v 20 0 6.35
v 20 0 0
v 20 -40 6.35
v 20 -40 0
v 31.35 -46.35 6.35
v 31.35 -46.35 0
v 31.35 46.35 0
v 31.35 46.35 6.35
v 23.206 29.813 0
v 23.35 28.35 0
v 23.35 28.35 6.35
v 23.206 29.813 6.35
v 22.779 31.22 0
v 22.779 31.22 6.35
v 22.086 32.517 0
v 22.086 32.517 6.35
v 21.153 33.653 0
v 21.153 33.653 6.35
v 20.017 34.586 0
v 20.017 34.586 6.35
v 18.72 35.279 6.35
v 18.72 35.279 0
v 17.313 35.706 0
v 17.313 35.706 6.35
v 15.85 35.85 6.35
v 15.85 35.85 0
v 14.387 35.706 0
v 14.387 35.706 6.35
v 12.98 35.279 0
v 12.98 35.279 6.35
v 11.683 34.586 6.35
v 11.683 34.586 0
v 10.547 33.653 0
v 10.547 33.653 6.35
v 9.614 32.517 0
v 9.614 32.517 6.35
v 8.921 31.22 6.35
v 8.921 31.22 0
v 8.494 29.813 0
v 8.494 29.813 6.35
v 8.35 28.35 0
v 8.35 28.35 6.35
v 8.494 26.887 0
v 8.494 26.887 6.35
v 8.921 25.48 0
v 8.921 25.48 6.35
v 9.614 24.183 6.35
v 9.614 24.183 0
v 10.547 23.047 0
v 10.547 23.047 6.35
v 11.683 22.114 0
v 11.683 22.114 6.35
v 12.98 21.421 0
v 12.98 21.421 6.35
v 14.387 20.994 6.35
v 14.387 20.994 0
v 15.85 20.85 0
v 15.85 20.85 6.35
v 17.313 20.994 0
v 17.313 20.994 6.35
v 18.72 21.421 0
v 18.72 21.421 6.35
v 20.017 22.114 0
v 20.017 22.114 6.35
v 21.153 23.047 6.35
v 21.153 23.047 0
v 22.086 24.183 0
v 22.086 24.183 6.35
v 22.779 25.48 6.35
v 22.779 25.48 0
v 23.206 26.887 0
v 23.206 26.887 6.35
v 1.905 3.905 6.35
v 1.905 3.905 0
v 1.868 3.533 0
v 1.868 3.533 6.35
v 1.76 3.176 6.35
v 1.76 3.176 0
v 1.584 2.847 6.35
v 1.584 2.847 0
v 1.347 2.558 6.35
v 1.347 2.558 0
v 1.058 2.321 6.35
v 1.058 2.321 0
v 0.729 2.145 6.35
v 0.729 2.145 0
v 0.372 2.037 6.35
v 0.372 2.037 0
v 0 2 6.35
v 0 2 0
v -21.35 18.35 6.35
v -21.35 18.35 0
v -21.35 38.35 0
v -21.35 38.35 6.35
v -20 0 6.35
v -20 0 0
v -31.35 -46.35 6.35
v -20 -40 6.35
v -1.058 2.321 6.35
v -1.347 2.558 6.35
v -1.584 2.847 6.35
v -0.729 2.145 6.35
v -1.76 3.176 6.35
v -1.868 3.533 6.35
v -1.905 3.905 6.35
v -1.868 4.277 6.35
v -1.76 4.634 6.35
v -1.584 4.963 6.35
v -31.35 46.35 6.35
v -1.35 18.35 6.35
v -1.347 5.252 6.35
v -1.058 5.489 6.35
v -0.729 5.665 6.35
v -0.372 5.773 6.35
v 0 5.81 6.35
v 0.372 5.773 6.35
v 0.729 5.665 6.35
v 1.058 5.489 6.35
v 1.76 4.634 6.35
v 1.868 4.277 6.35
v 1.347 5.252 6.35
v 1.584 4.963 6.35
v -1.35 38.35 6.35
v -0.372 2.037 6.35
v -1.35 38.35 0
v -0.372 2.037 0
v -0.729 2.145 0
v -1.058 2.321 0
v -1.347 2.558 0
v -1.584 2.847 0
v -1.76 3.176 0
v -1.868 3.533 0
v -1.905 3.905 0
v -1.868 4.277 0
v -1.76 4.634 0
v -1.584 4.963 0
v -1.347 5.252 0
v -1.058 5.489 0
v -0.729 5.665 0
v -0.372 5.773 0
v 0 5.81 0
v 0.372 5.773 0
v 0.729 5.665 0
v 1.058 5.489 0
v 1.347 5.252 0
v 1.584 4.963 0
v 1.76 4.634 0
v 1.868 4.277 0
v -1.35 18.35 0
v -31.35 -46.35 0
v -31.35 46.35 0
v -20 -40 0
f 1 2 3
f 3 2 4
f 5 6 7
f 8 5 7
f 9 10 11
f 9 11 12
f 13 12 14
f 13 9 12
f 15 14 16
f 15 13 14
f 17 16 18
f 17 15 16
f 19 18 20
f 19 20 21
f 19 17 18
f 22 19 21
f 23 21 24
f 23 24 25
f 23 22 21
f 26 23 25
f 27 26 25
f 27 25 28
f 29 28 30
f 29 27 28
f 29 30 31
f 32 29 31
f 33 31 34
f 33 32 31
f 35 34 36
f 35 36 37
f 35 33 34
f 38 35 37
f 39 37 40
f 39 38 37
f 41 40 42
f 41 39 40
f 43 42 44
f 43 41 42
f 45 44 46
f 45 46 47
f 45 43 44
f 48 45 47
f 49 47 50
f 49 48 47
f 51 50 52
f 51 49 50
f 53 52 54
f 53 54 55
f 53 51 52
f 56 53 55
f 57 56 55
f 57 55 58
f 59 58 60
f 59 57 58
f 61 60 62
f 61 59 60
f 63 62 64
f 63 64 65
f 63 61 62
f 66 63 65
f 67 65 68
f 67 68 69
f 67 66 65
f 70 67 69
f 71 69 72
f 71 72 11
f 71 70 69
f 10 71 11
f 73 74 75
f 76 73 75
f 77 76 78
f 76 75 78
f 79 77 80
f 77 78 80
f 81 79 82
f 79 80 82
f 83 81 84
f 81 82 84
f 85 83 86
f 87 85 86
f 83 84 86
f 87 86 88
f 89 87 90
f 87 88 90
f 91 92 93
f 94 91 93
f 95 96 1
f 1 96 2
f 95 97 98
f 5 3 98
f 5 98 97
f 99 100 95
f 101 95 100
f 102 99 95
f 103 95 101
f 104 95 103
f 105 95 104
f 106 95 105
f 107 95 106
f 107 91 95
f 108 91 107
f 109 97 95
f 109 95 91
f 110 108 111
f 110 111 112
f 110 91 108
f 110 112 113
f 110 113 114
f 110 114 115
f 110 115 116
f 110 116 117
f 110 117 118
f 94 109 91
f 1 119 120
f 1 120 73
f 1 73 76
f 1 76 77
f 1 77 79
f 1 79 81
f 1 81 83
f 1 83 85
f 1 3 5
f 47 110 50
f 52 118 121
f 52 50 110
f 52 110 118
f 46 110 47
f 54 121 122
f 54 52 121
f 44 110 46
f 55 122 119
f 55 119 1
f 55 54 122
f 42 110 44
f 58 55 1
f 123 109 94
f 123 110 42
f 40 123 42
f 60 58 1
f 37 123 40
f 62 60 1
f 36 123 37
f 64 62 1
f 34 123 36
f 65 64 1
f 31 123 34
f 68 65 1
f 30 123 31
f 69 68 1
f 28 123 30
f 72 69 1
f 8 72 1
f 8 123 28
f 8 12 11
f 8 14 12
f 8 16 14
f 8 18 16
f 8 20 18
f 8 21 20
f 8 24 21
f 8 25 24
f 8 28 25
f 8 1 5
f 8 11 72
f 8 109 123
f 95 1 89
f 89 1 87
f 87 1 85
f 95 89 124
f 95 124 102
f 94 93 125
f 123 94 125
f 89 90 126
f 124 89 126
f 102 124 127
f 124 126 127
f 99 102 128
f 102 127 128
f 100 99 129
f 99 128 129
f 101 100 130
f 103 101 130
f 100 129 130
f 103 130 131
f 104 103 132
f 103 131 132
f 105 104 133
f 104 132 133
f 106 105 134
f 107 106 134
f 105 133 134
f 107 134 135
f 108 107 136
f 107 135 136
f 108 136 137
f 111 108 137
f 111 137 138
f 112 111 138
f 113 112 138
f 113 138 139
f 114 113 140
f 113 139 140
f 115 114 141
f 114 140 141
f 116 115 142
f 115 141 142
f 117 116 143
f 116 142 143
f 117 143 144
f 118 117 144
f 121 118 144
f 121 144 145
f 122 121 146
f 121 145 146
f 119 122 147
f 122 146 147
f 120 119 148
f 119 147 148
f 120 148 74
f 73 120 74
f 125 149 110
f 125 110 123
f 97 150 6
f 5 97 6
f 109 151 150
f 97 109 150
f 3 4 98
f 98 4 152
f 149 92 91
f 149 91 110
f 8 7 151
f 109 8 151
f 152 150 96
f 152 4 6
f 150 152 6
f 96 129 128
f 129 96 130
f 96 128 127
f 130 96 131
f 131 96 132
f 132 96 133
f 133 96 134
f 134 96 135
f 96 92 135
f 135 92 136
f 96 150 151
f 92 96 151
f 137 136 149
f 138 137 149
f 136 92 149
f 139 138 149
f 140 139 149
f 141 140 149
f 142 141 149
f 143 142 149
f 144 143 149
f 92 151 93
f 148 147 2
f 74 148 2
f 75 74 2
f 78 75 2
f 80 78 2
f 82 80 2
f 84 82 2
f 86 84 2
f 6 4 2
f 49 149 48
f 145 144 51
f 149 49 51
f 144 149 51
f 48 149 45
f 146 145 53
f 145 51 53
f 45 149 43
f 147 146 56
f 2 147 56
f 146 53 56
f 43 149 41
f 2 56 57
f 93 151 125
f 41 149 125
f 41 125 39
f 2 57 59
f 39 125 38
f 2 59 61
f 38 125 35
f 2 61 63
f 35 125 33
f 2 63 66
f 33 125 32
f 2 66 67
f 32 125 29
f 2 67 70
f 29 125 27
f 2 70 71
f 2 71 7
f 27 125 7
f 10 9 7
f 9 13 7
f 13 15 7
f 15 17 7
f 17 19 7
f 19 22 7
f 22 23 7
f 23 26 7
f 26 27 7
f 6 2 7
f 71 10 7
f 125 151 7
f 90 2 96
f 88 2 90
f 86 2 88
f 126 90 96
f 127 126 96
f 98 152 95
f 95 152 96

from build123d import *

# Parameters (mm, degrees)
F0_W     = 20
F0_H     = 20
F0_R     = 7.5
F1_DEPTH = 6.35


with BuildPart() as f1:
    # F0 (on Top) → F1 (new body)
    with BuildSketch(Plane.XY):
        Polygon((31.35, -46.35), (31.35, 46.35), (-31.35, 46.35), (-31.35, -46.35), (0, -46.35), align=None)
        Polygon((20, -40), (0, -40), (-20, -40), (-20, 0), (0, 0), (20, 0), align=None, mode=Mode.SUBTRACT)
        with Locations((-11.35, 28.35)):
            Rectangle(F0_W, F0_H, mode=Mode.SUBTRACT)
        with BuildLine():
            ThreePointArc((1.905, 3.905), (1.347038, 2.557962), (0, 2))
            ThreePointArc((0, 2), (-1.347038, 5.252038), (1.905, 3.905))
        make_face(mode=Mode.SUBTRACT)
        with Locations((15.85, 28.35)):
            Circle(F0_R, mode=Mode.SUBTRACT)
    extrude(amount=F1_DEPTH)


solid = f1.part
